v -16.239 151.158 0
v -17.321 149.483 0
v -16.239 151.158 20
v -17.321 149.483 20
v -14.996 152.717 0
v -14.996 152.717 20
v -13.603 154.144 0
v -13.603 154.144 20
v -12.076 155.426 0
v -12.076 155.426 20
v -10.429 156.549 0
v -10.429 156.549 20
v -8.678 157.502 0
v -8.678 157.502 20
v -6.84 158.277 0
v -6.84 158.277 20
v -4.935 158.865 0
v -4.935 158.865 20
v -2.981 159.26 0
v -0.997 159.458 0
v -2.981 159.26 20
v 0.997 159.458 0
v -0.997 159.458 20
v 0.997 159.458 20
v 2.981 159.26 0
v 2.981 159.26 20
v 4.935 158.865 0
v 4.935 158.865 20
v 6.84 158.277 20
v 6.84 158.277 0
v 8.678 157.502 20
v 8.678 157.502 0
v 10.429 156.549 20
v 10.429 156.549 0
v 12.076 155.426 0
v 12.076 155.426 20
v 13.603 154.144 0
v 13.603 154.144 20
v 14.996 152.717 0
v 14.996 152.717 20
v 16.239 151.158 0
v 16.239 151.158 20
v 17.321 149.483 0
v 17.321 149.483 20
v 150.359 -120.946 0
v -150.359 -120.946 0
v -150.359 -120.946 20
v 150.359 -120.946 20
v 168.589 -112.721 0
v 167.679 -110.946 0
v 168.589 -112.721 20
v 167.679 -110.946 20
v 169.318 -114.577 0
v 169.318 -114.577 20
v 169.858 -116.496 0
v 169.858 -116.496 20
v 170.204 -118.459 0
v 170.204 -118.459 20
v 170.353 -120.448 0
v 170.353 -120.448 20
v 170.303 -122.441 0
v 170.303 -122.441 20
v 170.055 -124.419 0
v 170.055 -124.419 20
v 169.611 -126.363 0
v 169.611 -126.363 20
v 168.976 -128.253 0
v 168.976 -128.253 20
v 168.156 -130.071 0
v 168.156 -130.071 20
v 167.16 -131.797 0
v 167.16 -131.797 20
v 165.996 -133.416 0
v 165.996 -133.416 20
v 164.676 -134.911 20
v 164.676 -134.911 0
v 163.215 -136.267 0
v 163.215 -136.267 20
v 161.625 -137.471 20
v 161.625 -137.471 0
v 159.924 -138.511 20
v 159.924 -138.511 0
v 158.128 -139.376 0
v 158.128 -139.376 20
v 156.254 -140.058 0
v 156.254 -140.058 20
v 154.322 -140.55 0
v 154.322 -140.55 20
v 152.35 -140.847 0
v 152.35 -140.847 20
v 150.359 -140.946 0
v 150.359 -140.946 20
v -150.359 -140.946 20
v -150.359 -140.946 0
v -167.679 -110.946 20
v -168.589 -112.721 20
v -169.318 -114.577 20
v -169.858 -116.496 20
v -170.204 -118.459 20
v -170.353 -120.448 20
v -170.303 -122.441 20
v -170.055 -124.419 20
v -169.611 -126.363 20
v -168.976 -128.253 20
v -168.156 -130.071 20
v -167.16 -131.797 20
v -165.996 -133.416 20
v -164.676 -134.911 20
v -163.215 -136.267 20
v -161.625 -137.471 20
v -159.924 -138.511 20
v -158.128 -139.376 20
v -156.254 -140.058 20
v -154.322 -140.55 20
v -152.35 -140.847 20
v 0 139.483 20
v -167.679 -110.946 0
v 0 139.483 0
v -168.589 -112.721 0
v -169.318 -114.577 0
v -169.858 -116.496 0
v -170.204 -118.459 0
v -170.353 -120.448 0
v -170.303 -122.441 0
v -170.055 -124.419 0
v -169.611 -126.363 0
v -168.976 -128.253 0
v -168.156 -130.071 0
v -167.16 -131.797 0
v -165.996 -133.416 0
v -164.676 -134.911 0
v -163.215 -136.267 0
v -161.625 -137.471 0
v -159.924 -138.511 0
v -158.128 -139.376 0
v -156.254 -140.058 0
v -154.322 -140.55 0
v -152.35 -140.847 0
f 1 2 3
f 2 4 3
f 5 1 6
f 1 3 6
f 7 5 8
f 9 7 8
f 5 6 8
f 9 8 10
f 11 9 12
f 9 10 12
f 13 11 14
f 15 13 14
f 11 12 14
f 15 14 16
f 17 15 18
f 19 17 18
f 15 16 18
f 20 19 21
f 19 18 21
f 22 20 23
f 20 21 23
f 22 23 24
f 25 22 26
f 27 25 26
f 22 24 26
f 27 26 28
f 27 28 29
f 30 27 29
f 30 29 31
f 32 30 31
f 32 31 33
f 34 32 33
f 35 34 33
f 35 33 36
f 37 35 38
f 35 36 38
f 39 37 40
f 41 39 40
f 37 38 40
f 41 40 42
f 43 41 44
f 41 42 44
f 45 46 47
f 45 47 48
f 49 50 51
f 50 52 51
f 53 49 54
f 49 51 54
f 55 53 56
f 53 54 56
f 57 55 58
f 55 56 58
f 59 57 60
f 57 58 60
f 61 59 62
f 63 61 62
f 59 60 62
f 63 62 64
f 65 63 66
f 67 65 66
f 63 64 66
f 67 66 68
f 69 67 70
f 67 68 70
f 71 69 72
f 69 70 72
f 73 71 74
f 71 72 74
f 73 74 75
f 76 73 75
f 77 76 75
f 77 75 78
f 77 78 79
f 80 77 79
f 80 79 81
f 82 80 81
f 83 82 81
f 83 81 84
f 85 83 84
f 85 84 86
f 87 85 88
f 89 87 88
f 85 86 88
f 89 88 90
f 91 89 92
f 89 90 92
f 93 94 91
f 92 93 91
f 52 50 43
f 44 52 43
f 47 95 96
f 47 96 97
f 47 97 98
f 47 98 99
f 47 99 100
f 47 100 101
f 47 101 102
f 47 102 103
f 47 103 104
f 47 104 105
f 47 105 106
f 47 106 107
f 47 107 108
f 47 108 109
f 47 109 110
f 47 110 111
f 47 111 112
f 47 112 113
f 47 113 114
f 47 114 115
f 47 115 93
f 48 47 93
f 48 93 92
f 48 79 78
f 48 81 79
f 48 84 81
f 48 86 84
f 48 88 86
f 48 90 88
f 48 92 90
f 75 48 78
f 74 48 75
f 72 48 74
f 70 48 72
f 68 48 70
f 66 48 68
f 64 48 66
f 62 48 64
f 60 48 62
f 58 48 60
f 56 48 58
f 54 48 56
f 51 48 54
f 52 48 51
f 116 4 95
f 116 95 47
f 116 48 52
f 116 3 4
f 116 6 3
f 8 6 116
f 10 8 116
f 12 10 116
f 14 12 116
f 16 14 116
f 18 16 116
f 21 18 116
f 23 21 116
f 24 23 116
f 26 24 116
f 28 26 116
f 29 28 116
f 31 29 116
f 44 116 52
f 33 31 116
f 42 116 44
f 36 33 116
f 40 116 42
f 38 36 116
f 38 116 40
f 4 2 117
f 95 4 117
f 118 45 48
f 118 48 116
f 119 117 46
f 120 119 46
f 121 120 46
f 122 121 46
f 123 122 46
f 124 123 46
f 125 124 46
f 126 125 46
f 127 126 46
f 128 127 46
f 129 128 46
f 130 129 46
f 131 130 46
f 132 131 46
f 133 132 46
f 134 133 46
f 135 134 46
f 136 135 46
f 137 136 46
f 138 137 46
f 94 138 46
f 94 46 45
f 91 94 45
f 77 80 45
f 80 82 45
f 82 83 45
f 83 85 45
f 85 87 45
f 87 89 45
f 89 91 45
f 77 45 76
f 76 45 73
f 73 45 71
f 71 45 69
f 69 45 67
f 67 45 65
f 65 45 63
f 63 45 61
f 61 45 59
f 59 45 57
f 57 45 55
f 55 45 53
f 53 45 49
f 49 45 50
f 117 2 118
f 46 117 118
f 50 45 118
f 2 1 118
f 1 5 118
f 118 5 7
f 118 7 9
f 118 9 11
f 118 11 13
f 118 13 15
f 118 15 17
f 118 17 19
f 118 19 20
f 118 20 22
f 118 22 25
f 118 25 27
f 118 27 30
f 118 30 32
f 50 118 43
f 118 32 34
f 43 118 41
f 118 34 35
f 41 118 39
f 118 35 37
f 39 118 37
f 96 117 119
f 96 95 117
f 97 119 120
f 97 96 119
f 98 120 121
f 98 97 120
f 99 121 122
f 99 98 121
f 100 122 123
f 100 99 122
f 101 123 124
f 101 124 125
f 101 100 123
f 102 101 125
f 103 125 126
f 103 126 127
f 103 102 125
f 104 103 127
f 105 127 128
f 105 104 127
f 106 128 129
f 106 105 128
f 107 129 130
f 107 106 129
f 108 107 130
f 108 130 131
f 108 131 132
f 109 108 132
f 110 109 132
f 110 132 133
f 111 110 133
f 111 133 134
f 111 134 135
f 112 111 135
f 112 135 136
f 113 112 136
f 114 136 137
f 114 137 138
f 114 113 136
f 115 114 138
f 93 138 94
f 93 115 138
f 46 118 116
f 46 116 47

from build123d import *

# Parameters (mm, degrees)
EXTRUDE_1_DEPTH = 20
FILLET_1_R      = 20


with BuildPart() as part:
    # 草圖1 → 填料-伸長1 (new body)
    with BuildSketch(Plane.XY):
        Polygon((0, 179.483059357), (-185, -140.946340043), (185, -140.946340043), align=None)
        Polygon((0, 139.483059357), (-150.358983849, -120.946340043), (150.358983849, -120.946340043), align=None, mode=Mode.SUBTRACT)
    extrude(amount=EXTRUDE_1_DEPTH)

    # 圓角1
    fillet_1_edges = [part.edges().sort_by_distance(p)[0] for p in [
        (185, -140.946340043, 10),
        (-185, -140.946340043, 10),
        (0, 179.483059357, 10),
    ]]
    fillet(fillet_1_edges, radius=FILLET_1_R)


solid = part.part
